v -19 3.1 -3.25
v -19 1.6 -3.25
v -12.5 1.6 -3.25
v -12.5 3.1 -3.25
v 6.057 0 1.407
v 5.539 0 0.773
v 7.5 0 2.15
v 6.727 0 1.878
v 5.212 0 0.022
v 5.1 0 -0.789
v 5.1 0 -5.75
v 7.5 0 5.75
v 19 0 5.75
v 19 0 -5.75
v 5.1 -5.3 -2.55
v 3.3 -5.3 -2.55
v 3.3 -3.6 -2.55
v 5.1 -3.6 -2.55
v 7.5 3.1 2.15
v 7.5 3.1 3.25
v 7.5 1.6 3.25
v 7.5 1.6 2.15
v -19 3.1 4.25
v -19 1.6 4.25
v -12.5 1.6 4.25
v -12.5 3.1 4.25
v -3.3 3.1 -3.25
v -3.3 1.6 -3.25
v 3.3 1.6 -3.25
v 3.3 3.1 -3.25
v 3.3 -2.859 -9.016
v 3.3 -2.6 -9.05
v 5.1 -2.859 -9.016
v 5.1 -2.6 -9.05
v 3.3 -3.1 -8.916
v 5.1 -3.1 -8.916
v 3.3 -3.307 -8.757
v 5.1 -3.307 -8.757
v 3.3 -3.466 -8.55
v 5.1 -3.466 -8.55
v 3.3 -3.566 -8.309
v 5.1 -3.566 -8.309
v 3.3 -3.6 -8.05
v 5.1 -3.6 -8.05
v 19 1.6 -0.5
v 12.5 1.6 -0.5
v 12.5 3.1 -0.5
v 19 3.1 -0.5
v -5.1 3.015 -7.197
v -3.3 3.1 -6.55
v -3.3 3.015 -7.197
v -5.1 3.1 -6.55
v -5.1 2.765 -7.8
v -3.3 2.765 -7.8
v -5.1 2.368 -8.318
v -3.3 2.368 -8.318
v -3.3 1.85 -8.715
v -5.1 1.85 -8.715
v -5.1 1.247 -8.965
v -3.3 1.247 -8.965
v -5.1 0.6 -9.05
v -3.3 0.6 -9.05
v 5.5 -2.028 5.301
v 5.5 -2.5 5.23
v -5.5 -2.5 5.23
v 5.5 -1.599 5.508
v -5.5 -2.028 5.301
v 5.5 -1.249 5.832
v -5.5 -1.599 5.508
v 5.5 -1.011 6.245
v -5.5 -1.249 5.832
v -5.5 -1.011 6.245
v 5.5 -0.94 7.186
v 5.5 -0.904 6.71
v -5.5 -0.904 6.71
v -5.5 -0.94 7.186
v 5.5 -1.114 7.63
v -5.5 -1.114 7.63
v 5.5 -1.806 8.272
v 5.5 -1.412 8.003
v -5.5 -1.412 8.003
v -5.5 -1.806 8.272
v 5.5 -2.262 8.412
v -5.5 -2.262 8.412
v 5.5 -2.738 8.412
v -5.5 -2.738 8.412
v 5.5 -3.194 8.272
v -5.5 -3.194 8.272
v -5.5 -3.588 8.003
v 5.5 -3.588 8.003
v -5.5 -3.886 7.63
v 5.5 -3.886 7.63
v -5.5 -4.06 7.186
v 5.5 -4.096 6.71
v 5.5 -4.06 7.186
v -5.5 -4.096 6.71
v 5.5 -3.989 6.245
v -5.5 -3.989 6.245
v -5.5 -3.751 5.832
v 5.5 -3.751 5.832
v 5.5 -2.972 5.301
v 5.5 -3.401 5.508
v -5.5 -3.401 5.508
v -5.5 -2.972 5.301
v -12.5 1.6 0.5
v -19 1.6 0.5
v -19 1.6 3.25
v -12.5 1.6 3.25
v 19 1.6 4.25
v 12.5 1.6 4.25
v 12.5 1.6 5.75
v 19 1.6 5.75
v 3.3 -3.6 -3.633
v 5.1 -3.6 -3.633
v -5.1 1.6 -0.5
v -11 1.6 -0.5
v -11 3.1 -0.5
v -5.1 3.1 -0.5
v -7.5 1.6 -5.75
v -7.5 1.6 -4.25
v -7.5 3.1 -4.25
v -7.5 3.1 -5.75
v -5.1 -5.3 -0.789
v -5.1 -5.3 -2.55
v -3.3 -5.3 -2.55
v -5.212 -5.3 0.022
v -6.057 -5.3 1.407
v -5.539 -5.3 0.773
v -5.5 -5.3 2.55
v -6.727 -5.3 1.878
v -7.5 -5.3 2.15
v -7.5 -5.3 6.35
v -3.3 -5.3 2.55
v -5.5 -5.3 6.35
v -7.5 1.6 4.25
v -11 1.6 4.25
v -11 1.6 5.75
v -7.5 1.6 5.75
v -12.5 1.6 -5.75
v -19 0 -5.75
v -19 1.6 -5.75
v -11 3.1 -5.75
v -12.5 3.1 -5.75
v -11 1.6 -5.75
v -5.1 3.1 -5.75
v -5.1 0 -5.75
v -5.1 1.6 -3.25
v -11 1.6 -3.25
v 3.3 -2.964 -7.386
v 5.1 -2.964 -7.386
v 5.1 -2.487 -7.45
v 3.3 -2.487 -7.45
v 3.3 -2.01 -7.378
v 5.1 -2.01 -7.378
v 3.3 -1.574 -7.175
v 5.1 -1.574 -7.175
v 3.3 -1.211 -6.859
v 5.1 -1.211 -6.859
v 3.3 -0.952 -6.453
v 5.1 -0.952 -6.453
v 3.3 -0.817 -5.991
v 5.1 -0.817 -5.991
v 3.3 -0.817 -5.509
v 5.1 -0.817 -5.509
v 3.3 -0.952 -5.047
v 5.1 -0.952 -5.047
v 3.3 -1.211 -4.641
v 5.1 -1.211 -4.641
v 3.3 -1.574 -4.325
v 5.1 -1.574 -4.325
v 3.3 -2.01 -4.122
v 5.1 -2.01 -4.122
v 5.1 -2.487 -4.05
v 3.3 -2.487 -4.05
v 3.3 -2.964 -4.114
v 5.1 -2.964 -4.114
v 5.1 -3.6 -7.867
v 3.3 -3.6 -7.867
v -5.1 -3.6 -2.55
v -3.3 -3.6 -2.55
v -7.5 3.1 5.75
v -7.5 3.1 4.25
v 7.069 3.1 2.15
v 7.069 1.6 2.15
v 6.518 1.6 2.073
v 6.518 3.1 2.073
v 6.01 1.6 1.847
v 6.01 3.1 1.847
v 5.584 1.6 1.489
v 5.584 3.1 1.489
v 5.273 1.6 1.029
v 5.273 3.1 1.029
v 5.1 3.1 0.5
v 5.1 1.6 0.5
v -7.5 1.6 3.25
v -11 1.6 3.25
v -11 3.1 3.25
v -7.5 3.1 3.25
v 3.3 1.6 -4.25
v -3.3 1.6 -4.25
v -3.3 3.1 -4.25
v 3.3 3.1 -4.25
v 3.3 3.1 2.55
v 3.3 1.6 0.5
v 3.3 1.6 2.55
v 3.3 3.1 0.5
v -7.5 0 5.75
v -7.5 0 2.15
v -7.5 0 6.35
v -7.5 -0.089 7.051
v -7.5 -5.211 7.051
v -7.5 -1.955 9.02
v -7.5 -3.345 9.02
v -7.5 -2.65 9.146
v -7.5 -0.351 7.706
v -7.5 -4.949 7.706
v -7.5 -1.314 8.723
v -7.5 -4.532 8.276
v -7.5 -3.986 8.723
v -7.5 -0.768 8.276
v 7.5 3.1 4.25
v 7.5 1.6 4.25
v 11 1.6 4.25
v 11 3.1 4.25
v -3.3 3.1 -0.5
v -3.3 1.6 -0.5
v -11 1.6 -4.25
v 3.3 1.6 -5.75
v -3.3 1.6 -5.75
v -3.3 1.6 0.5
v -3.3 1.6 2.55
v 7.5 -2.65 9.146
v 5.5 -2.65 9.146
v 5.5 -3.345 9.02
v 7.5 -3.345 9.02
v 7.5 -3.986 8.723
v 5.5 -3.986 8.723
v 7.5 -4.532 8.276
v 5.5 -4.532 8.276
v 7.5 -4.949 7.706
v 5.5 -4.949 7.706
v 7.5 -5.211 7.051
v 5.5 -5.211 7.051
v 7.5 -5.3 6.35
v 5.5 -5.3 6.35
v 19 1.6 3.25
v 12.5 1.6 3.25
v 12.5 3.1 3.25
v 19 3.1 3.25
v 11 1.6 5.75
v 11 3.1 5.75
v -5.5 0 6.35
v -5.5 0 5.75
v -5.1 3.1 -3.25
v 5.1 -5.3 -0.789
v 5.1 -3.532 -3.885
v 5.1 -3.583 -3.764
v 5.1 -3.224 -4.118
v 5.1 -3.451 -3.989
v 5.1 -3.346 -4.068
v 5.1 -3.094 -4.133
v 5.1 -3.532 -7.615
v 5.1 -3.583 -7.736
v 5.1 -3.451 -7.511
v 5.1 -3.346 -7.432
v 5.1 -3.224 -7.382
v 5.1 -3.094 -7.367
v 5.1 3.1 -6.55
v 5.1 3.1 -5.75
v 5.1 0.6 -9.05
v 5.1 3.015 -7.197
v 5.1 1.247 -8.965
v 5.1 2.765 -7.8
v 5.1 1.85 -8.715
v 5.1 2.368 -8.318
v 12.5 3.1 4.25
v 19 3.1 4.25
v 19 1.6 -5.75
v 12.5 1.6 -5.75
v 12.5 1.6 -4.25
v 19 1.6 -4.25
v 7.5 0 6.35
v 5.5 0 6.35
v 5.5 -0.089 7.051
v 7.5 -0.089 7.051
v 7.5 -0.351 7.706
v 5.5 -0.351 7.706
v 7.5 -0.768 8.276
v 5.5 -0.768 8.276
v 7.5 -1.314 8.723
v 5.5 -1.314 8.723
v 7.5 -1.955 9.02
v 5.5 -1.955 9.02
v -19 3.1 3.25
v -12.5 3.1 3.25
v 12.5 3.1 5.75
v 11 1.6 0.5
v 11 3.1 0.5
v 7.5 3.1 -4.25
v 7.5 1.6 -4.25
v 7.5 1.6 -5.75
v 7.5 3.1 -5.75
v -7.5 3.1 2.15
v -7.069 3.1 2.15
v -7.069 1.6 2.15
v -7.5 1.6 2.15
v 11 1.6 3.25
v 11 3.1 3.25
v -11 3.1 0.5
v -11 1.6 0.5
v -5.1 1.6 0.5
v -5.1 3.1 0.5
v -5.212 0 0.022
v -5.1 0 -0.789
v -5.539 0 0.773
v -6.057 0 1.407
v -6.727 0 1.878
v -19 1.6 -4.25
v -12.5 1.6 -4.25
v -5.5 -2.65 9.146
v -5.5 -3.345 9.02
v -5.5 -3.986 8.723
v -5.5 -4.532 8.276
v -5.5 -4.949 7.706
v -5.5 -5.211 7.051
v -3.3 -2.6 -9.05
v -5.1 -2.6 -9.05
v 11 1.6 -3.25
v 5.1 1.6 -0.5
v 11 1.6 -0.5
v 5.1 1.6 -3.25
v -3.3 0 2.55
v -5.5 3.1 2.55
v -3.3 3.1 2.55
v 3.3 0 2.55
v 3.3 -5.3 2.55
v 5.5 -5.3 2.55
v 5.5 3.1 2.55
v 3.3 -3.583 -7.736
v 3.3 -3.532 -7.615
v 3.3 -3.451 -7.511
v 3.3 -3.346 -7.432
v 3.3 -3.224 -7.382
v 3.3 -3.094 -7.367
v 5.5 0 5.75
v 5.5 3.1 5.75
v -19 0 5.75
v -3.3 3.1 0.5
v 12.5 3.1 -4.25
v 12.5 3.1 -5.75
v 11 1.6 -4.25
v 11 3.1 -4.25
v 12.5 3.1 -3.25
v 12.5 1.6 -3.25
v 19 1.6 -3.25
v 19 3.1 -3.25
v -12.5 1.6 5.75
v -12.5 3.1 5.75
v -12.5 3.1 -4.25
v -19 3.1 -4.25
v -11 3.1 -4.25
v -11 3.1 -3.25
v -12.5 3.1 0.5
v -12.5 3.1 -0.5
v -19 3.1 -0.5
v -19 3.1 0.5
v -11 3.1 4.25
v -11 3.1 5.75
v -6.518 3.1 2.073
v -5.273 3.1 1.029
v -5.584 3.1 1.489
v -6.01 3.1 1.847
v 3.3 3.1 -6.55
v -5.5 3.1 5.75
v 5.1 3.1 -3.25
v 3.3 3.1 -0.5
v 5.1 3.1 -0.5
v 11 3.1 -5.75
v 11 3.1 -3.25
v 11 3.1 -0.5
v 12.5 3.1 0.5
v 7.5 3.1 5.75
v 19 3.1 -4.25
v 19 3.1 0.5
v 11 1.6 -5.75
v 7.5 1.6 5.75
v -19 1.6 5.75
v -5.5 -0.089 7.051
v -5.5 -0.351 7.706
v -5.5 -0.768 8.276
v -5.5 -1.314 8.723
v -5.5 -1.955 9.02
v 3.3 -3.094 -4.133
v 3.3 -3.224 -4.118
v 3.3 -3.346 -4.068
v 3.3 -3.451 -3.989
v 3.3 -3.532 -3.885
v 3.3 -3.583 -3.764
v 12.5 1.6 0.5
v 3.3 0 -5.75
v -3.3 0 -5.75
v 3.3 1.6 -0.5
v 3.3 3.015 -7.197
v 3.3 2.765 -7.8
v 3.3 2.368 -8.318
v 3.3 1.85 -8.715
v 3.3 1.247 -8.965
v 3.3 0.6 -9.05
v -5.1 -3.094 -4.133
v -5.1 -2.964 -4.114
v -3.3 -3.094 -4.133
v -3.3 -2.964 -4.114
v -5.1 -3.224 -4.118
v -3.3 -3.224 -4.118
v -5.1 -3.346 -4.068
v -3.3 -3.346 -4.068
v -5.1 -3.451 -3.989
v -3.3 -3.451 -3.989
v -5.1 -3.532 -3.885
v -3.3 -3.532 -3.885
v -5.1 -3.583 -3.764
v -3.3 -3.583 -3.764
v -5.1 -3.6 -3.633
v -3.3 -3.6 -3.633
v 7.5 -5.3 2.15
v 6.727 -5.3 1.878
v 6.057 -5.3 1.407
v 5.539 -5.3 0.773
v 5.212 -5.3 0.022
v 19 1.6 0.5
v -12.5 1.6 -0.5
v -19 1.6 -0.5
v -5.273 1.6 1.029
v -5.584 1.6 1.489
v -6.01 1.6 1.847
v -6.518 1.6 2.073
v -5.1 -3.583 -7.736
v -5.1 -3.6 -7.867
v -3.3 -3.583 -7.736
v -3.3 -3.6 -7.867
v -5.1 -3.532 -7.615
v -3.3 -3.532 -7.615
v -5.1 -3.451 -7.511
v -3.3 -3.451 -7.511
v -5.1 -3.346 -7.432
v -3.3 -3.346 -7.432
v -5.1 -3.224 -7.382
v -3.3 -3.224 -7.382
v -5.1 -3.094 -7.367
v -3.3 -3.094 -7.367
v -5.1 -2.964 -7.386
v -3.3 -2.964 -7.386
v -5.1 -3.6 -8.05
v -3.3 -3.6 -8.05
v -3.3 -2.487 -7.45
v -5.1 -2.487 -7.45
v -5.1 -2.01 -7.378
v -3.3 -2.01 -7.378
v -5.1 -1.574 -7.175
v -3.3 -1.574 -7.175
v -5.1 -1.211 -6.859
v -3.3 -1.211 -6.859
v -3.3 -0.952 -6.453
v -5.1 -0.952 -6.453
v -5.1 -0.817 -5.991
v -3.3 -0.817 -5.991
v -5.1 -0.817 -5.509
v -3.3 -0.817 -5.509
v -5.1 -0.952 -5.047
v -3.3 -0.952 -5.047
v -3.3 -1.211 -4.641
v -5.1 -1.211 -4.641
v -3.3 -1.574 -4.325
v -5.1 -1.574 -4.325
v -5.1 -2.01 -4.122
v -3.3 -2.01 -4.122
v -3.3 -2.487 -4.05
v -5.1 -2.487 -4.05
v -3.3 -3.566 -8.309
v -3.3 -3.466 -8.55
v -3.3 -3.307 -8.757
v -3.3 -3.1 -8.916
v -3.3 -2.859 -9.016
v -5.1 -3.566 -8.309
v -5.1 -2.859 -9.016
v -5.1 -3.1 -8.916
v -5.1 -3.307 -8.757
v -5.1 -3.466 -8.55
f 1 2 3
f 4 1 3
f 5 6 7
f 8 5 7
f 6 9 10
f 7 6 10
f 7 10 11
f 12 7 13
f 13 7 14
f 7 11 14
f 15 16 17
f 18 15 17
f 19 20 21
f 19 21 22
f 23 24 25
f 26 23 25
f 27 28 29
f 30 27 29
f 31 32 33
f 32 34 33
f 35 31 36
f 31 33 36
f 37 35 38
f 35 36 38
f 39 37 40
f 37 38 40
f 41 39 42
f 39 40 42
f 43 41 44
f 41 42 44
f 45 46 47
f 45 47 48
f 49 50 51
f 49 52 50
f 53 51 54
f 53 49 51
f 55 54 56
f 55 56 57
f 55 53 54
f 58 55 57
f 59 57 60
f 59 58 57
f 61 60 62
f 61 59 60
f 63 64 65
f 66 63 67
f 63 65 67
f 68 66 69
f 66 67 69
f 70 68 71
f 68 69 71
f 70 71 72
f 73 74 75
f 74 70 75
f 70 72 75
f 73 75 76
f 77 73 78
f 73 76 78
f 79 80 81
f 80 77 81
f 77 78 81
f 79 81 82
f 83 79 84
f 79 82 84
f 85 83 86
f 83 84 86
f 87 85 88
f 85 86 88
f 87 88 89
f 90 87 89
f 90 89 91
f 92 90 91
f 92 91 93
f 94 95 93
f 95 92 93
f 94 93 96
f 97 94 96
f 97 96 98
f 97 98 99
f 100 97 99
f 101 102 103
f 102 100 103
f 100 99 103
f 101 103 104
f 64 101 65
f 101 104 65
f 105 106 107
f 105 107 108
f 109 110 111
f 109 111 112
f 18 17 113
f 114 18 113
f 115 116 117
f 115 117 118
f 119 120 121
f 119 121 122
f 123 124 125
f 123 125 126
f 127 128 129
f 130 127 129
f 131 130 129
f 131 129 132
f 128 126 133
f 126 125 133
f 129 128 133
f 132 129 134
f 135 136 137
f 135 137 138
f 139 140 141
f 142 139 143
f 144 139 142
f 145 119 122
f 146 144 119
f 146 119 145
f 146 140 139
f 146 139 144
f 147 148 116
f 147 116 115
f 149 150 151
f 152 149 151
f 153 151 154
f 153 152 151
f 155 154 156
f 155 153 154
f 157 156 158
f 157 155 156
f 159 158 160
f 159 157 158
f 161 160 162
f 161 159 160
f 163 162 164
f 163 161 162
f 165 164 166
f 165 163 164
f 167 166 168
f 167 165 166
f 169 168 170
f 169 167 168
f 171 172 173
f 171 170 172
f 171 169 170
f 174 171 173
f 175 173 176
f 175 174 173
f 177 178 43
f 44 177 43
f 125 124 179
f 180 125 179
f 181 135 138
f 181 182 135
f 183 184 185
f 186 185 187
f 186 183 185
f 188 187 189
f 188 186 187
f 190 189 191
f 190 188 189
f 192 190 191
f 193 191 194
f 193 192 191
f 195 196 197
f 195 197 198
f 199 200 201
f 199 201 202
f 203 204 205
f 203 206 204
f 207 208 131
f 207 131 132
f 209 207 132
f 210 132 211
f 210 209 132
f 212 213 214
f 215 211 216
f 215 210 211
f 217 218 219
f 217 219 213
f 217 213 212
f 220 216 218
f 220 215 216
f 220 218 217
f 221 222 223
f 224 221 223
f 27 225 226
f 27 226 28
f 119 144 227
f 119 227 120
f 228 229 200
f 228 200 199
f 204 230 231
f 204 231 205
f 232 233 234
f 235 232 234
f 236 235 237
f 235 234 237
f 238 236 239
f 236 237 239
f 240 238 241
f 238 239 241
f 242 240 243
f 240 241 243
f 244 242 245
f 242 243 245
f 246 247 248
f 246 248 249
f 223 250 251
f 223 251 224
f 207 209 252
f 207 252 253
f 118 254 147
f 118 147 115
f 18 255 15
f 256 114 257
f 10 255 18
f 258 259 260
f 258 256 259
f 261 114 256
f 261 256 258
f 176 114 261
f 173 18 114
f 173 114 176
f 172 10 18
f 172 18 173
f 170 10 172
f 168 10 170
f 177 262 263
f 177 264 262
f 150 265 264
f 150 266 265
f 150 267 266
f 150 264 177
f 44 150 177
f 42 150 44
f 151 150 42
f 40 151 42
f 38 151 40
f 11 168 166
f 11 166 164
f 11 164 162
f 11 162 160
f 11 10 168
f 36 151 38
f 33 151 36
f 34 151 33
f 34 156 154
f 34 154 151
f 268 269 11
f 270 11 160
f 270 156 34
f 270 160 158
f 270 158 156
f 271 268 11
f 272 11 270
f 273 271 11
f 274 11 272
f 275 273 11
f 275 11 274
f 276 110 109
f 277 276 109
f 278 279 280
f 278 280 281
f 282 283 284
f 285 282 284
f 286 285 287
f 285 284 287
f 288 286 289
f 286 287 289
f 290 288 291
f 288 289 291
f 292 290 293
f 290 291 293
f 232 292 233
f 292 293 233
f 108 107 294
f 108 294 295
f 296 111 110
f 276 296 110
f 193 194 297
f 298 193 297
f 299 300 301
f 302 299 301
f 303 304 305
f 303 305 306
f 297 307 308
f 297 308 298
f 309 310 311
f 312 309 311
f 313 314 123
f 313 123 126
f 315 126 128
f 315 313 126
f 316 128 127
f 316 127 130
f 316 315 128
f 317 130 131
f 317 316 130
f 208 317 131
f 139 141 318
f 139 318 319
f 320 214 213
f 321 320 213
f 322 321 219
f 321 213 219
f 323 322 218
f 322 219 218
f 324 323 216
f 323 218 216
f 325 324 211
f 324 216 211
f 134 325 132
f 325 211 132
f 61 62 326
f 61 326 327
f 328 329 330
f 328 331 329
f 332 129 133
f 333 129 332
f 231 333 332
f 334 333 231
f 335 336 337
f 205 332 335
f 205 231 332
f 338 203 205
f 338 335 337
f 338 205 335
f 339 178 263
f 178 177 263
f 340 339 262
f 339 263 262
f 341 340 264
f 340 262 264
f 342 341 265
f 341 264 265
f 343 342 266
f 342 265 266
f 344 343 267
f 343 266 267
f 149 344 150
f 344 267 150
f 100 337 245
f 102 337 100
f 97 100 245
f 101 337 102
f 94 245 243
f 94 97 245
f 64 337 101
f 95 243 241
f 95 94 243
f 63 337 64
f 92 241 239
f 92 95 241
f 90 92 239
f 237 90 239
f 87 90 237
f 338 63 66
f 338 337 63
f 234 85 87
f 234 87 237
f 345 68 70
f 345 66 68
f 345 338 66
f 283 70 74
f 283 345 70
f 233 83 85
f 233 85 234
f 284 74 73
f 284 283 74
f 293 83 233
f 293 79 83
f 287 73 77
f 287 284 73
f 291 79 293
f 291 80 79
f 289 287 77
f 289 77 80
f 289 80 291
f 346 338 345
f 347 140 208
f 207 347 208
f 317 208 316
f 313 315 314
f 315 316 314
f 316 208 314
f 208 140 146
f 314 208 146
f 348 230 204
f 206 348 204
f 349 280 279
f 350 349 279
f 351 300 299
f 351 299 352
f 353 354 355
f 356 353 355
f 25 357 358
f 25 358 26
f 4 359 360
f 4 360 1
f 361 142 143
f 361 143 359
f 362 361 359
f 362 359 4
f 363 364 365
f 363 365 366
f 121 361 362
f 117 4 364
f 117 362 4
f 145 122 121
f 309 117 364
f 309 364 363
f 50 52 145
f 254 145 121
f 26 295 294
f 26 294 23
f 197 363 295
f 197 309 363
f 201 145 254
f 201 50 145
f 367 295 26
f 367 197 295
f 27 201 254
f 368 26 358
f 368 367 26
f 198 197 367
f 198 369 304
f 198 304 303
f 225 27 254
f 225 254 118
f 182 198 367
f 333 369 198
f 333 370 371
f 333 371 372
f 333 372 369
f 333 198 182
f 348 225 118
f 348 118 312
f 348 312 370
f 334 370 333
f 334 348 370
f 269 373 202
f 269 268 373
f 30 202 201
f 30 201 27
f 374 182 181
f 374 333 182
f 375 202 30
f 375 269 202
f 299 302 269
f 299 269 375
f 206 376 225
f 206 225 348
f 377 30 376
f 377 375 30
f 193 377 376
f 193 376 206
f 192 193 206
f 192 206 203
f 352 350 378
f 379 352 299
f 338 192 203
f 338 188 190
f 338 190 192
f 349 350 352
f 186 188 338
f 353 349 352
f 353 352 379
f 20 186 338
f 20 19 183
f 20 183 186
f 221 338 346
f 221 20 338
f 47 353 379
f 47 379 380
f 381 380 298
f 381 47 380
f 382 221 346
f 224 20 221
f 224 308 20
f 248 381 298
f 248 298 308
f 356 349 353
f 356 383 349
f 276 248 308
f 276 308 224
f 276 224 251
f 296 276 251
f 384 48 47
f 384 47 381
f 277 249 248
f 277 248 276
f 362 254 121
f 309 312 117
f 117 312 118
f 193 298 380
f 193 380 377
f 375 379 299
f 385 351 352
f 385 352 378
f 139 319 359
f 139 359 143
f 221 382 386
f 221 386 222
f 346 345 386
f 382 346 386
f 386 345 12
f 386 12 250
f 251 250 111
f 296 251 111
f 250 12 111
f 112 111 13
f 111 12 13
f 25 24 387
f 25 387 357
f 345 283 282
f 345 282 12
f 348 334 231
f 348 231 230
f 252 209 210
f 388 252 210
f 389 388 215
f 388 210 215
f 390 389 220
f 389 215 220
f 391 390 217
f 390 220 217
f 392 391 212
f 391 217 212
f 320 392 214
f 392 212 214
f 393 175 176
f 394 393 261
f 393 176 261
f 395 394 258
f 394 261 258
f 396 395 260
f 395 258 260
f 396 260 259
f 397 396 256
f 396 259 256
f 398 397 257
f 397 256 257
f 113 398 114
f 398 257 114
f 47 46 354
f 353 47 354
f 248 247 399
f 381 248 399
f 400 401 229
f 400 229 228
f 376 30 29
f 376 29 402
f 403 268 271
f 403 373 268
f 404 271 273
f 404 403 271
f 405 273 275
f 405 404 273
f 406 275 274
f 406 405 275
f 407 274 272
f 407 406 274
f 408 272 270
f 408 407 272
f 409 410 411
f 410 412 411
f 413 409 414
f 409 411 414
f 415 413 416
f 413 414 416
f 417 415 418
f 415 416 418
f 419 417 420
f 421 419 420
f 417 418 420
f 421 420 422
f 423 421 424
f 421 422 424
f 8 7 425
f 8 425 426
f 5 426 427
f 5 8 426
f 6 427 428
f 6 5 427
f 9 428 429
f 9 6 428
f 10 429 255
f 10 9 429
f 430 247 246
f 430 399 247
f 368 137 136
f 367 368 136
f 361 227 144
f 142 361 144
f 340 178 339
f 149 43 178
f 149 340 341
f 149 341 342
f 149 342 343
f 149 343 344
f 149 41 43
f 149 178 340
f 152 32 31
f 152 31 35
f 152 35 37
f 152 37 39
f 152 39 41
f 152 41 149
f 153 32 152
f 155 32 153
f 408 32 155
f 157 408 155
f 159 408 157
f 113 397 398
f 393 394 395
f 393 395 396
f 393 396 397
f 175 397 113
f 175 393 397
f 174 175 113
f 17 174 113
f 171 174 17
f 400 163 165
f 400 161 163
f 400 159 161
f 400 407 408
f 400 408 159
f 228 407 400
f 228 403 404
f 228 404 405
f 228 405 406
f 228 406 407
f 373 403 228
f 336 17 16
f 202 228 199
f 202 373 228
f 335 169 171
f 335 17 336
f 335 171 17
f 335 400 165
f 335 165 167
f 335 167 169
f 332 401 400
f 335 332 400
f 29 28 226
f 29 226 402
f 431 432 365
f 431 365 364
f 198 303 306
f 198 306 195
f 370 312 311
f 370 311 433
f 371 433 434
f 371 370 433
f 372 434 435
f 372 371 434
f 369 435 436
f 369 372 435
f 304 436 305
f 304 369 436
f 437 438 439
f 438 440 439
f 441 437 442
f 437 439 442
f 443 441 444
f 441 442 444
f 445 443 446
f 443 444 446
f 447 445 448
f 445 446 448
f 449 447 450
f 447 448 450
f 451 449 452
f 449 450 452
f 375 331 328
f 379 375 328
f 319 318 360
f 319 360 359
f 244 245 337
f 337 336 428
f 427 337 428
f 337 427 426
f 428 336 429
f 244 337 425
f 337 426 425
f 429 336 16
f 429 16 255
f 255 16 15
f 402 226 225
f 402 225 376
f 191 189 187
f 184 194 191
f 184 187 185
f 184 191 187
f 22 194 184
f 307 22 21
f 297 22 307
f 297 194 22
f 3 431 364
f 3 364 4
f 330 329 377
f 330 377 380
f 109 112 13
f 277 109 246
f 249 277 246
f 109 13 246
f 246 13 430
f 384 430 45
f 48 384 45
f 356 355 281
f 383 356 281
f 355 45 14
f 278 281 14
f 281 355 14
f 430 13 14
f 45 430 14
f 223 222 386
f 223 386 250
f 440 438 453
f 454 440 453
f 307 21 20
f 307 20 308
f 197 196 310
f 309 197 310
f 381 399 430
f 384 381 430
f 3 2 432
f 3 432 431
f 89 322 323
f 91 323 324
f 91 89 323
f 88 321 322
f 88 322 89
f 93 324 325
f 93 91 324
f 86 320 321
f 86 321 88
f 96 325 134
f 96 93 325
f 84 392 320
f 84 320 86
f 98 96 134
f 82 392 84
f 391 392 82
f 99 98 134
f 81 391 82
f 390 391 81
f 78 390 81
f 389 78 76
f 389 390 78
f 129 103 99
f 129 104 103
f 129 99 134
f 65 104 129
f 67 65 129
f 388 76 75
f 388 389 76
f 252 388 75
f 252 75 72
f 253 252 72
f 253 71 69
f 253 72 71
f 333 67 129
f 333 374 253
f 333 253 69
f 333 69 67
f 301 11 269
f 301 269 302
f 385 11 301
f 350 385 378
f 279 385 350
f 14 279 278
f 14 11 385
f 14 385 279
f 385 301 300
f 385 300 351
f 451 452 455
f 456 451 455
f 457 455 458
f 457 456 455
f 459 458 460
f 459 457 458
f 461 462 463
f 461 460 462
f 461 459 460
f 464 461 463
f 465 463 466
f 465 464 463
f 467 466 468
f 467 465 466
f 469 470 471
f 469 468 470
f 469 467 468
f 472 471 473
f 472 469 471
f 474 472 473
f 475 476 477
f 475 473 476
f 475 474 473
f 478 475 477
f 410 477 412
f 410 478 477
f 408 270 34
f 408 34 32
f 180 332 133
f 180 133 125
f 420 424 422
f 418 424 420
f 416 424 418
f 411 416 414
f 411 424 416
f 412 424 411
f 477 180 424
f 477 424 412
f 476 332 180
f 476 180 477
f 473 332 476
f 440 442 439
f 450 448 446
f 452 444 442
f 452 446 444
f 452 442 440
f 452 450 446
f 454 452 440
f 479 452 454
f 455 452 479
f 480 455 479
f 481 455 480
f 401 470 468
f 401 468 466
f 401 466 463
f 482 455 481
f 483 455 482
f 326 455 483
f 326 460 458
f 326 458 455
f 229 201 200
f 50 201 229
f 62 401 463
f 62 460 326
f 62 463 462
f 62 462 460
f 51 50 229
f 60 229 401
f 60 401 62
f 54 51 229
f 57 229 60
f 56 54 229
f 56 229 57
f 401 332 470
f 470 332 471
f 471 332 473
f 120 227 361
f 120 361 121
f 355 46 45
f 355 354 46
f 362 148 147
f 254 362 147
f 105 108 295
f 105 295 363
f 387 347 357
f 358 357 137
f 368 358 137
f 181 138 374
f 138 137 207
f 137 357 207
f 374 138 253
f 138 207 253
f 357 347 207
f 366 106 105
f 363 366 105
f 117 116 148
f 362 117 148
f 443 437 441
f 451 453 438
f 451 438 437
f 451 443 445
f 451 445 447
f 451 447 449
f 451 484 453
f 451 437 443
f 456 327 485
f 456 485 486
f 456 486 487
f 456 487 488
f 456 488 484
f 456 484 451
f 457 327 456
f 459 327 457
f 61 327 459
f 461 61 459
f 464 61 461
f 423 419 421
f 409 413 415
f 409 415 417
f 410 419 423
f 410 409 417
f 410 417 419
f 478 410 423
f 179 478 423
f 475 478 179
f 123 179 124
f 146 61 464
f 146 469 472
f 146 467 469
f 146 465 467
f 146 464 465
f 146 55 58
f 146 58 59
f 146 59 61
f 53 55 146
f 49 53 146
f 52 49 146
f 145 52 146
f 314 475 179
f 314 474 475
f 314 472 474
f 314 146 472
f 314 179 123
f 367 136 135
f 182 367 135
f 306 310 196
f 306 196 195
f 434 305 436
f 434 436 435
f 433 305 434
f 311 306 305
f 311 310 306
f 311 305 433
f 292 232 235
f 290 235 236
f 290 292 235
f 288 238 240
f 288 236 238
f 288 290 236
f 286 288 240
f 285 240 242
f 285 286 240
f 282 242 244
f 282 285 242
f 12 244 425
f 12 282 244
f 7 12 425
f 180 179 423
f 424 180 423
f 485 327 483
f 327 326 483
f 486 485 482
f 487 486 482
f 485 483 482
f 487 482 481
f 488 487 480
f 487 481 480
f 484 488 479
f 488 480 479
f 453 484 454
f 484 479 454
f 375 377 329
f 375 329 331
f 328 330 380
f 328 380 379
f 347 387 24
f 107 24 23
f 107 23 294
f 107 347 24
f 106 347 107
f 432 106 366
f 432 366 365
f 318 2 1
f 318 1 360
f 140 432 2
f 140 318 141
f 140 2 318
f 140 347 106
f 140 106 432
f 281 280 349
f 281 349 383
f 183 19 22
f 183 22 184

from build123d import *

# Parameters (mm, degrees)
SKETCH_1_W               = 38
SKETCH_1_H               = 11.5
EXTRUDE_1_DEPTH          = 1.6
EXTRUDE_START            = 1.6
SKETCH_1_3_W             = 38
SKETCH_1_3_H             = 1
SKETCH_1_3_W_2           = 1.5
SKETCH_1_3_H_2           = 11.5
EXTRUDE_2_DEPTH          = 1.5
EXTRUDE_START_2          = 3.1
EXTRUDE_3_DEPTH          = 8.4
SKETCH_2_4_W             = 2.4
SKETCH_2_4_H             = 1.5
EXTRUDE_5_DEPTH          = 3.1
CUT_EXTRUDE_1_DEPTH      = 22.744252114
FILLET_1_R               = 3
EXTRUDE_4_REACH          = 28.684
SKETCH_3_R               = 1.6
CUT_EXTRUDE_2_DEPTH      = 27.684499246
CUT_EXTRUDE_2_DEPTH_BACK = 27.684499246
SKETCH_3_3_R             = 1.7
SKETCH_3_3_W             = 6.5
SKETCH_3_3_H             = 1.7
SKETCH_3_3_W_2           = 3.4
SKETCH_3_3_H_2           = 3.1
FILLET_2_R               = 2.8
FILLET_3_R               = 2.5
FILLET_4_R               = 1
FILLET_5_R               = 0.5
FILLET_6_R               = 2


with BuildPart() as part:
    # 草图1 → 凸台-拉伸1 (new body)
    with BuildSketch(Plane(origin=(0, 0, 0), x_dir=(1, 0, 0), z_dir=(0, 1, 0))):
        Rectangle(SKETCH_1_W, SKETCH_1_H)
    extrude(amount=EXTRUDE_1_DEPTH)

    # 草图1<3> → 凸台-拉伸2 (add)
    with BuildSketch(Plane(origin=(0, 0, 0), x_dir=(1, 0, 0), z_dir=(0, 1, 0)).offset(EXTRUDE_START)):
        with Locations((0, 3.75)):
            Rectangle(SKETCH_1_3_W, SKETCH_1_3_H)
        Rectangle(SKETCH_1_3_W, SKETCH_1_3_H)
        with Locations((0, -3.75)):
            Rectangle(SKETCH_1_3_W, SKETCH_1_3_H)
        with Locations((-11.75, 0)):
            Rectangle(SKETCH_1_3_W_2, SKETCH_1_3_H_2)
        with Locations((11.75, 0)):
            Rectangle(SKETCH_1_3_W_2, SKETCH_1_3_H_2)
    extrude(amount=EXTRUDE_2_DEPTH)

    # 草图2 → 凸台-拉伸3 (add)
    with BuildSketch(Plane(origin=(0, 0, 0), x_dir=(1, 0, 0), z_dir=(0, 1, 0)).offset(EXTRUDE_START_2)):
        Polygon((-3.3, 9.05), (-5.1, 9.05), (-5.1, -2.15), (-7.5, -2.15), (-7.5, -9.15), (-5.5, -9.15), (-5.5, -2.55), (-3.3, -2.55), align=None)
        Polygon((5.1, 9.05), (3.3, 9.05), (3.3, -2.55), (5.5, -2.55), (5.5, -9.15), (7.5, -9.15), (7.5, -2.15), (5.1, -2.15), align=None)
    extrude(amount=-EXTRUDE_3_DEPTH)

    # 草图2<4> → 凸台-拉伸5 (add)
    with BuildSketch(Plane(origin=(0, 0, 0), x_dir=(1, 0, 0), z_dir=(0, 1, 0))):
        with Locations((-6.3, 5)):
            Rectangle(SKETCH_2_4_W, SKETCH_2_4_H)
        with Locations((6.3, 5)):
            Rectangle(SKETCH_2_4_W, SKETCH_2_4_H)
    extrude(amount=EXTRUDE_5_DEPTH)

    # 草图2<3> → 切除-拉伸1 (cut, through all)
    with BuildSketch(Plane(origin=(0, 0, 0), x_dir=(1, 0, 0), z_dir=(0, 1, 0))):
        Polygon((0, -9.15), (0, -2.55), (-3.3, -2.55), (-5.1, -2.55), (-5.5, -2.55), (-5.5, -9.15), align=None)
        Polygon((3.3, -2.55), (0, -2.55), (0, -9.15), (5.5, -9.15), (5.5, -2.55), (5.1, -2.55), align=None)
    extrude(amount=CUT_EXTRUDE_1_DEPTH, mode=Mode.SUBTRACT)

    # 圆角1
    # the kernel refuses this fillet: 3 mm, written as the material it adds along each edge
    with BuildSketch(Plane(origin=(5.1, 7.348469228, 2.15), x_dir=(0, 0, -1), z_dir=(0, -1, 0))) as fillet_1_piece_1_section:
        with BuildLine():
            CenterArc((2.939387691, 3), FILLET_1_R, 191.536959033, 78.463040967)
            Line((0, 2.4), (0, 0))
            Line((0, 0), (2.939387691, 0))
        make_face()
    fillet_1_piece_1 = extrude(amount=12.648469228, mode=Mode.PRIVATE)
    fillet_1_piece_1 = split(fillet_1_piece_1, bisect_by=Plane(origin=(5.102900281, 1.6, -0.644495887), z_dir=(0, -1, 0)), keep=Keep.TOP, mode=Mode.PRIVATE)
    add(fillet_1_piece_1)
    with BuildSketch(Plane(origin=(-5.1, 0, 2.15), x_dir=(0, 0, -1), z_dir=(0, -1, 0))) as fillet_1_piece_2:
        with BuildLine():
            CenterArc((2.939387691, -3), FILLET_1_R, 90, 78.463040967)
            Line((0, -2.4), (0, 0))
            Line((0, 0), (2.939387691, 0))
        make_face()
    extrude(amount=5.3)

    # 草图3 → 凸台-拉伸4 (add, up to next)
    with BuildSketch(Plane(origin=(-5.5, 0, 0), x_dir=(0, 0, -1), z_dir=(1, 0, 0)), mode=Mode.PRIVATE) as extrude_4_sk1:
        with Locations((-6.83, -2.5)):
            Circle(SKETCH_3_R)
    extrude_4_tool1 = extrude(extrude_4_sk1.sketch, amount=EXTRUDE_4_REACH, mode=Mode.PRIVATE) - part.part
    add(extrude_4_tool1.solids().sort_by_distance((-5.5, -2.5, 6.83))[0])

    # 草图3<3> → 切除-拉伸2 (cut, two sides: drawn at the far end of the back side and taken through both)
    with BuildSketch(Plane(origin=(-5.5, 0, 0), x_dir=(0, 0, -1), z_dir=(1, 0, 0)).offset(-CUT_EXTRUDE_2_DEPTH_BACK)):
        with Locations((5.75, -2.5)):
            Circle(SKETCH_3_3_R)
        with Locations((5.8, -4.45)):
            Rectangle(SKETCH_3_3_W, SKETCH_3_3_H)
        with Locations((-7.45, 1.55)):
            Rectangle(SKETCH_3_3_W_2, SKETCH_3_3_H_2)
    extrude(amount=CUT_EXTRUDE_2_DEPTH + CUT_EXTRUDE_2_DEPTH_BACK, mode=Mode.SUBTRACT)

    # 圆角2
    # the kernel refuses this fillet: 2.8 mm, written as the material it takes off along each edge
    with BuildSketch(Plane(origin=(-1.5, 0, 9.15), x_dir=(0, 0, -1), z_dir=(1, 0, 0)), Plane(origin=(-14.5, 0, 9.15), x_dir=(0, 0, -1), z_dir=(1, 0, 0))) as fillet_2_piece_1:
        with BuildLine():
            CenterArc((FILLET_2_R, -FILLET_2_R), FILLET_2_R, 90, 90)
            Line((0, -FILLET_2_R), (0, 0))
            Line((0, 0), (FILLET_2_R, 0))
        make_face()
    extrude(amount=16, mode=Mode.SUBTRACT)
    with BuildSketch(Plane(origin=(-1.5, -5.3, 9.15), x_dir=(0, 0, -1), z_dir=(1, 0, 0)), Plane(origin=(-14.5, -5.3, 9.15), x_dir=(0, 0, -1), z_dir=(1, 0, 0))) as fillet_2_piece_2:
        with BuildLine():
            CenterArc((FILLET_2_R, FILLET_2_R), FILLET_2_R, 180, 90)
            Line((0, FILLET_2_R), (0, 0))
            Line((0, 0), (FILLET_2_R, 0))
        make_face()
    extrude(amount=16, mode=Mode.SUBTRACT)

    # 圆角3
    fillet_3_edges = [part.edges().sort_by_distance(p)[0] for p in [
        (-4.2, 3.1, -9.05),
        (4.2, 3.1, -9.05),
    ]]
    fillet(fillet_3_edges, radius=FILLET_3_R)

    # 圆角4
    fillet_4_edges = [part.edges().sort_by_distance(p)[0] for p in [
        (-4.2, -3.6, -9.05),
        (4.2, -3.6, -9.05),
    ]]
    fillet(fillet_4_edges, radius=FILLET_4_R)

    # 圆角5
    fillet_5_edges = [part.edges().sort_by_distance(p)[0] for p in [
        (-4.2, -3.6, -4.45385186),
        (4.2, -3.6, -4.45385186),
        (-4.2, -3.6, -7.04614814),
        (4.2, -3.6, -7.04614814),
    ]]
    fillet(fillet_5_edges, radius=FILLET_5_R)

    # 圆角6
    # the kernel refuses this fillet: 2 mm, written as the material it adds along each edge
    with BuildSketch(Plane(origin=(5.1, 3.1, 2.15), x_dir=(0, 0, -1), z_dir=(0, -1, 0))) as fillet_6_piece_1:
        with BuildLine():
            CenterArc((2, 1.969136867), FILLET_6_R, 180, 79.921341892)
            Line((0, 1.969136867), (-0.04, 1.969136867))
            Line((-0.04, 1.969136867), (-0.04, 0))
            Line((-0.04, 0), (0, -0.04))
            ThreePointArc((0, -0.04), (0.825, -0.04), (1.643, -0.039382737))
            Line((1.643, -0.039382737), (1.65, 0))
        make_face()
    extrude(amount=6.422842167)
    with BuildSketch(Plane(origin=(-5.1, 3.1, 2.15), x_dir=(-1, 0, 0), z_dir=(0, -1, 0))) as fillet_6_piece_2:
        with BuildLine():
            CenterArc((1.969136867, 2), FILLET_6_R, 190.078658108, 79.921341892)
            Line((0, 1.65), (-0.039382737, 1.643))
            ThreePointArc((-0.039382737, 1.643), (-0.04, 0.825), (-0.04, 0))
            Line((-0.04, 0), (0, -0.04))
            Line((0, -0.04), (1.969136867, -0.04))
            Line((1.969136867, -0.04), (1.969136867, 0))
        make_face()
    extrude(amount=6.422842167)


solid = part.part
